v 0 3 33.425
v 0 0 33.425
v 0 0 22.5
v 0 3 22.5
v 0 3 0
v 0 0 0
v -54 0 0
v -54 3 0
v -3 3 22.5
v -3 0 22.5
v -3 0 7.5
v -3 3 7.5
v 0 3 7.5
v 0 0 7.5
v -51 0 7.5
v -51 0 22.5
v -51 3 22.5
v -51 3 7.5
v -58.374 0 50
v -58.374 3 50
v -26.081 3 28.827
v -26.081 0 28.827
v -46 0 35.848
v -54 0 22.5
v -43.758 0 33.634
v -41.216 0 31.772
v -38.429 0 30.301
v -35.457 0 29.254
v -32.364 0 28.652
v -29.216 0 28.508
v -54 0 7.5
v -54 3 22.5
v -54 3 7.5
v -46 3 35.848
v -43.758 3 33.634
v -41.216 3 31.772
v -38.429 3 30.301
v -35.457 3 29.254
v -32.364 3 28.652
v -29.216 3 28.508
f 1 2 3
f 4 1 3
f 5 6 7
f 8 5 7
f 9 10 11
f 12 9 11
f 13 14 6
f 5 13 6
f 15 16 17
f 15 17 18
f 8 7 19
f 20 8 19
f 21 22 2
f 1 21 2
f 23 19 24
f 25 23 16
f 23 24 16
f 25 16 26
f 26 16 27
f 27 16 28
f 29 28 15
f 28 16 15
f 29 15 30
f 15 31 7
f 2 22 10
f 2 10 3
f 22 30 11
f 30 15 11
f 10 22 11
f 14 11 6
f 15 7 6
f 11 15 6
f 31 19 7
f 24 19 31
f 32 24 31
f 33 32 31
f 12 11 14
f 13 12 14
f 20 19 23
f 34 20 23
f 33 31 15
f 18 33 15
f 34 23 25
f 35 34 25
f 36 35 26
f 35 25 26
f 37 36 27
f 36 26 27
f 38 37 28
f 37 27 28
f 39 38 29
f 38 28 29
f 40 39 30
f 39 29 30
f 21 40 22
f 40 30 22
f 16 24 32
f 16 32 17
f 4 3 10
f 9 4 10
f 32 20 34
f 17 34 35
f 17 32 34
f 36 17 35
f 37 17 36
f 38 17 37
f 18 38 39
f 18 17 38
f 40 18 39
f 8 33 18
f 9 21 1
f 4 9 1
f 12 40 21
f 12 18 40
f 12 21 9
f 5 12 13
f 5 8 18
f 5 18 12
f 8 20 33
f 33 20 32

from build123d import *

# Parameters (mm, degrees)
SKETCH1_W           = 3
SKETCH1_H           = 15
BOSS_EXTRUDE1_DEPTH = 3


with BuildPart() as part:
    # Sketch1 → Boss-Extrude1 (new body)
    with BuildSketch(Plane(origin=(0, 0, 0), x_dir=(1, 0, 0), z_dir=(0, 1, 0))):
        with BuildLine():
            Line((0, 0), (-54, 0))
            Line((-54, 0), (-58.374433176, -50))
            Line((-58.374433176, -50), (-46, -35.847809072))
            ThreePointArc((-46, -35.847809072), (-36.962151982, -29.722839373), (-26.081216116, -28.82663331))
            Line((-26.081216116, -28.82663331), (0, -33.425455401))
            Line((0, -33.425455401), (0, -22.5))
            Line((0, -22.5), (-3, -22.5))
            Line((-3, -22.5), (-3, -7.5))
            Line((-3, -7.5), (0, -7.5))
            Line((0, -7.5), (0, 0))
        make_face()
        with Locations((-52.5, -15)):
            Rectangle(SKETCH1_W, SKETCH1_H, mode=Mode.SUBTRACT)
    extrude(amount=BOSS_EXTRUDE1_DEPTH)


solid = part.part
